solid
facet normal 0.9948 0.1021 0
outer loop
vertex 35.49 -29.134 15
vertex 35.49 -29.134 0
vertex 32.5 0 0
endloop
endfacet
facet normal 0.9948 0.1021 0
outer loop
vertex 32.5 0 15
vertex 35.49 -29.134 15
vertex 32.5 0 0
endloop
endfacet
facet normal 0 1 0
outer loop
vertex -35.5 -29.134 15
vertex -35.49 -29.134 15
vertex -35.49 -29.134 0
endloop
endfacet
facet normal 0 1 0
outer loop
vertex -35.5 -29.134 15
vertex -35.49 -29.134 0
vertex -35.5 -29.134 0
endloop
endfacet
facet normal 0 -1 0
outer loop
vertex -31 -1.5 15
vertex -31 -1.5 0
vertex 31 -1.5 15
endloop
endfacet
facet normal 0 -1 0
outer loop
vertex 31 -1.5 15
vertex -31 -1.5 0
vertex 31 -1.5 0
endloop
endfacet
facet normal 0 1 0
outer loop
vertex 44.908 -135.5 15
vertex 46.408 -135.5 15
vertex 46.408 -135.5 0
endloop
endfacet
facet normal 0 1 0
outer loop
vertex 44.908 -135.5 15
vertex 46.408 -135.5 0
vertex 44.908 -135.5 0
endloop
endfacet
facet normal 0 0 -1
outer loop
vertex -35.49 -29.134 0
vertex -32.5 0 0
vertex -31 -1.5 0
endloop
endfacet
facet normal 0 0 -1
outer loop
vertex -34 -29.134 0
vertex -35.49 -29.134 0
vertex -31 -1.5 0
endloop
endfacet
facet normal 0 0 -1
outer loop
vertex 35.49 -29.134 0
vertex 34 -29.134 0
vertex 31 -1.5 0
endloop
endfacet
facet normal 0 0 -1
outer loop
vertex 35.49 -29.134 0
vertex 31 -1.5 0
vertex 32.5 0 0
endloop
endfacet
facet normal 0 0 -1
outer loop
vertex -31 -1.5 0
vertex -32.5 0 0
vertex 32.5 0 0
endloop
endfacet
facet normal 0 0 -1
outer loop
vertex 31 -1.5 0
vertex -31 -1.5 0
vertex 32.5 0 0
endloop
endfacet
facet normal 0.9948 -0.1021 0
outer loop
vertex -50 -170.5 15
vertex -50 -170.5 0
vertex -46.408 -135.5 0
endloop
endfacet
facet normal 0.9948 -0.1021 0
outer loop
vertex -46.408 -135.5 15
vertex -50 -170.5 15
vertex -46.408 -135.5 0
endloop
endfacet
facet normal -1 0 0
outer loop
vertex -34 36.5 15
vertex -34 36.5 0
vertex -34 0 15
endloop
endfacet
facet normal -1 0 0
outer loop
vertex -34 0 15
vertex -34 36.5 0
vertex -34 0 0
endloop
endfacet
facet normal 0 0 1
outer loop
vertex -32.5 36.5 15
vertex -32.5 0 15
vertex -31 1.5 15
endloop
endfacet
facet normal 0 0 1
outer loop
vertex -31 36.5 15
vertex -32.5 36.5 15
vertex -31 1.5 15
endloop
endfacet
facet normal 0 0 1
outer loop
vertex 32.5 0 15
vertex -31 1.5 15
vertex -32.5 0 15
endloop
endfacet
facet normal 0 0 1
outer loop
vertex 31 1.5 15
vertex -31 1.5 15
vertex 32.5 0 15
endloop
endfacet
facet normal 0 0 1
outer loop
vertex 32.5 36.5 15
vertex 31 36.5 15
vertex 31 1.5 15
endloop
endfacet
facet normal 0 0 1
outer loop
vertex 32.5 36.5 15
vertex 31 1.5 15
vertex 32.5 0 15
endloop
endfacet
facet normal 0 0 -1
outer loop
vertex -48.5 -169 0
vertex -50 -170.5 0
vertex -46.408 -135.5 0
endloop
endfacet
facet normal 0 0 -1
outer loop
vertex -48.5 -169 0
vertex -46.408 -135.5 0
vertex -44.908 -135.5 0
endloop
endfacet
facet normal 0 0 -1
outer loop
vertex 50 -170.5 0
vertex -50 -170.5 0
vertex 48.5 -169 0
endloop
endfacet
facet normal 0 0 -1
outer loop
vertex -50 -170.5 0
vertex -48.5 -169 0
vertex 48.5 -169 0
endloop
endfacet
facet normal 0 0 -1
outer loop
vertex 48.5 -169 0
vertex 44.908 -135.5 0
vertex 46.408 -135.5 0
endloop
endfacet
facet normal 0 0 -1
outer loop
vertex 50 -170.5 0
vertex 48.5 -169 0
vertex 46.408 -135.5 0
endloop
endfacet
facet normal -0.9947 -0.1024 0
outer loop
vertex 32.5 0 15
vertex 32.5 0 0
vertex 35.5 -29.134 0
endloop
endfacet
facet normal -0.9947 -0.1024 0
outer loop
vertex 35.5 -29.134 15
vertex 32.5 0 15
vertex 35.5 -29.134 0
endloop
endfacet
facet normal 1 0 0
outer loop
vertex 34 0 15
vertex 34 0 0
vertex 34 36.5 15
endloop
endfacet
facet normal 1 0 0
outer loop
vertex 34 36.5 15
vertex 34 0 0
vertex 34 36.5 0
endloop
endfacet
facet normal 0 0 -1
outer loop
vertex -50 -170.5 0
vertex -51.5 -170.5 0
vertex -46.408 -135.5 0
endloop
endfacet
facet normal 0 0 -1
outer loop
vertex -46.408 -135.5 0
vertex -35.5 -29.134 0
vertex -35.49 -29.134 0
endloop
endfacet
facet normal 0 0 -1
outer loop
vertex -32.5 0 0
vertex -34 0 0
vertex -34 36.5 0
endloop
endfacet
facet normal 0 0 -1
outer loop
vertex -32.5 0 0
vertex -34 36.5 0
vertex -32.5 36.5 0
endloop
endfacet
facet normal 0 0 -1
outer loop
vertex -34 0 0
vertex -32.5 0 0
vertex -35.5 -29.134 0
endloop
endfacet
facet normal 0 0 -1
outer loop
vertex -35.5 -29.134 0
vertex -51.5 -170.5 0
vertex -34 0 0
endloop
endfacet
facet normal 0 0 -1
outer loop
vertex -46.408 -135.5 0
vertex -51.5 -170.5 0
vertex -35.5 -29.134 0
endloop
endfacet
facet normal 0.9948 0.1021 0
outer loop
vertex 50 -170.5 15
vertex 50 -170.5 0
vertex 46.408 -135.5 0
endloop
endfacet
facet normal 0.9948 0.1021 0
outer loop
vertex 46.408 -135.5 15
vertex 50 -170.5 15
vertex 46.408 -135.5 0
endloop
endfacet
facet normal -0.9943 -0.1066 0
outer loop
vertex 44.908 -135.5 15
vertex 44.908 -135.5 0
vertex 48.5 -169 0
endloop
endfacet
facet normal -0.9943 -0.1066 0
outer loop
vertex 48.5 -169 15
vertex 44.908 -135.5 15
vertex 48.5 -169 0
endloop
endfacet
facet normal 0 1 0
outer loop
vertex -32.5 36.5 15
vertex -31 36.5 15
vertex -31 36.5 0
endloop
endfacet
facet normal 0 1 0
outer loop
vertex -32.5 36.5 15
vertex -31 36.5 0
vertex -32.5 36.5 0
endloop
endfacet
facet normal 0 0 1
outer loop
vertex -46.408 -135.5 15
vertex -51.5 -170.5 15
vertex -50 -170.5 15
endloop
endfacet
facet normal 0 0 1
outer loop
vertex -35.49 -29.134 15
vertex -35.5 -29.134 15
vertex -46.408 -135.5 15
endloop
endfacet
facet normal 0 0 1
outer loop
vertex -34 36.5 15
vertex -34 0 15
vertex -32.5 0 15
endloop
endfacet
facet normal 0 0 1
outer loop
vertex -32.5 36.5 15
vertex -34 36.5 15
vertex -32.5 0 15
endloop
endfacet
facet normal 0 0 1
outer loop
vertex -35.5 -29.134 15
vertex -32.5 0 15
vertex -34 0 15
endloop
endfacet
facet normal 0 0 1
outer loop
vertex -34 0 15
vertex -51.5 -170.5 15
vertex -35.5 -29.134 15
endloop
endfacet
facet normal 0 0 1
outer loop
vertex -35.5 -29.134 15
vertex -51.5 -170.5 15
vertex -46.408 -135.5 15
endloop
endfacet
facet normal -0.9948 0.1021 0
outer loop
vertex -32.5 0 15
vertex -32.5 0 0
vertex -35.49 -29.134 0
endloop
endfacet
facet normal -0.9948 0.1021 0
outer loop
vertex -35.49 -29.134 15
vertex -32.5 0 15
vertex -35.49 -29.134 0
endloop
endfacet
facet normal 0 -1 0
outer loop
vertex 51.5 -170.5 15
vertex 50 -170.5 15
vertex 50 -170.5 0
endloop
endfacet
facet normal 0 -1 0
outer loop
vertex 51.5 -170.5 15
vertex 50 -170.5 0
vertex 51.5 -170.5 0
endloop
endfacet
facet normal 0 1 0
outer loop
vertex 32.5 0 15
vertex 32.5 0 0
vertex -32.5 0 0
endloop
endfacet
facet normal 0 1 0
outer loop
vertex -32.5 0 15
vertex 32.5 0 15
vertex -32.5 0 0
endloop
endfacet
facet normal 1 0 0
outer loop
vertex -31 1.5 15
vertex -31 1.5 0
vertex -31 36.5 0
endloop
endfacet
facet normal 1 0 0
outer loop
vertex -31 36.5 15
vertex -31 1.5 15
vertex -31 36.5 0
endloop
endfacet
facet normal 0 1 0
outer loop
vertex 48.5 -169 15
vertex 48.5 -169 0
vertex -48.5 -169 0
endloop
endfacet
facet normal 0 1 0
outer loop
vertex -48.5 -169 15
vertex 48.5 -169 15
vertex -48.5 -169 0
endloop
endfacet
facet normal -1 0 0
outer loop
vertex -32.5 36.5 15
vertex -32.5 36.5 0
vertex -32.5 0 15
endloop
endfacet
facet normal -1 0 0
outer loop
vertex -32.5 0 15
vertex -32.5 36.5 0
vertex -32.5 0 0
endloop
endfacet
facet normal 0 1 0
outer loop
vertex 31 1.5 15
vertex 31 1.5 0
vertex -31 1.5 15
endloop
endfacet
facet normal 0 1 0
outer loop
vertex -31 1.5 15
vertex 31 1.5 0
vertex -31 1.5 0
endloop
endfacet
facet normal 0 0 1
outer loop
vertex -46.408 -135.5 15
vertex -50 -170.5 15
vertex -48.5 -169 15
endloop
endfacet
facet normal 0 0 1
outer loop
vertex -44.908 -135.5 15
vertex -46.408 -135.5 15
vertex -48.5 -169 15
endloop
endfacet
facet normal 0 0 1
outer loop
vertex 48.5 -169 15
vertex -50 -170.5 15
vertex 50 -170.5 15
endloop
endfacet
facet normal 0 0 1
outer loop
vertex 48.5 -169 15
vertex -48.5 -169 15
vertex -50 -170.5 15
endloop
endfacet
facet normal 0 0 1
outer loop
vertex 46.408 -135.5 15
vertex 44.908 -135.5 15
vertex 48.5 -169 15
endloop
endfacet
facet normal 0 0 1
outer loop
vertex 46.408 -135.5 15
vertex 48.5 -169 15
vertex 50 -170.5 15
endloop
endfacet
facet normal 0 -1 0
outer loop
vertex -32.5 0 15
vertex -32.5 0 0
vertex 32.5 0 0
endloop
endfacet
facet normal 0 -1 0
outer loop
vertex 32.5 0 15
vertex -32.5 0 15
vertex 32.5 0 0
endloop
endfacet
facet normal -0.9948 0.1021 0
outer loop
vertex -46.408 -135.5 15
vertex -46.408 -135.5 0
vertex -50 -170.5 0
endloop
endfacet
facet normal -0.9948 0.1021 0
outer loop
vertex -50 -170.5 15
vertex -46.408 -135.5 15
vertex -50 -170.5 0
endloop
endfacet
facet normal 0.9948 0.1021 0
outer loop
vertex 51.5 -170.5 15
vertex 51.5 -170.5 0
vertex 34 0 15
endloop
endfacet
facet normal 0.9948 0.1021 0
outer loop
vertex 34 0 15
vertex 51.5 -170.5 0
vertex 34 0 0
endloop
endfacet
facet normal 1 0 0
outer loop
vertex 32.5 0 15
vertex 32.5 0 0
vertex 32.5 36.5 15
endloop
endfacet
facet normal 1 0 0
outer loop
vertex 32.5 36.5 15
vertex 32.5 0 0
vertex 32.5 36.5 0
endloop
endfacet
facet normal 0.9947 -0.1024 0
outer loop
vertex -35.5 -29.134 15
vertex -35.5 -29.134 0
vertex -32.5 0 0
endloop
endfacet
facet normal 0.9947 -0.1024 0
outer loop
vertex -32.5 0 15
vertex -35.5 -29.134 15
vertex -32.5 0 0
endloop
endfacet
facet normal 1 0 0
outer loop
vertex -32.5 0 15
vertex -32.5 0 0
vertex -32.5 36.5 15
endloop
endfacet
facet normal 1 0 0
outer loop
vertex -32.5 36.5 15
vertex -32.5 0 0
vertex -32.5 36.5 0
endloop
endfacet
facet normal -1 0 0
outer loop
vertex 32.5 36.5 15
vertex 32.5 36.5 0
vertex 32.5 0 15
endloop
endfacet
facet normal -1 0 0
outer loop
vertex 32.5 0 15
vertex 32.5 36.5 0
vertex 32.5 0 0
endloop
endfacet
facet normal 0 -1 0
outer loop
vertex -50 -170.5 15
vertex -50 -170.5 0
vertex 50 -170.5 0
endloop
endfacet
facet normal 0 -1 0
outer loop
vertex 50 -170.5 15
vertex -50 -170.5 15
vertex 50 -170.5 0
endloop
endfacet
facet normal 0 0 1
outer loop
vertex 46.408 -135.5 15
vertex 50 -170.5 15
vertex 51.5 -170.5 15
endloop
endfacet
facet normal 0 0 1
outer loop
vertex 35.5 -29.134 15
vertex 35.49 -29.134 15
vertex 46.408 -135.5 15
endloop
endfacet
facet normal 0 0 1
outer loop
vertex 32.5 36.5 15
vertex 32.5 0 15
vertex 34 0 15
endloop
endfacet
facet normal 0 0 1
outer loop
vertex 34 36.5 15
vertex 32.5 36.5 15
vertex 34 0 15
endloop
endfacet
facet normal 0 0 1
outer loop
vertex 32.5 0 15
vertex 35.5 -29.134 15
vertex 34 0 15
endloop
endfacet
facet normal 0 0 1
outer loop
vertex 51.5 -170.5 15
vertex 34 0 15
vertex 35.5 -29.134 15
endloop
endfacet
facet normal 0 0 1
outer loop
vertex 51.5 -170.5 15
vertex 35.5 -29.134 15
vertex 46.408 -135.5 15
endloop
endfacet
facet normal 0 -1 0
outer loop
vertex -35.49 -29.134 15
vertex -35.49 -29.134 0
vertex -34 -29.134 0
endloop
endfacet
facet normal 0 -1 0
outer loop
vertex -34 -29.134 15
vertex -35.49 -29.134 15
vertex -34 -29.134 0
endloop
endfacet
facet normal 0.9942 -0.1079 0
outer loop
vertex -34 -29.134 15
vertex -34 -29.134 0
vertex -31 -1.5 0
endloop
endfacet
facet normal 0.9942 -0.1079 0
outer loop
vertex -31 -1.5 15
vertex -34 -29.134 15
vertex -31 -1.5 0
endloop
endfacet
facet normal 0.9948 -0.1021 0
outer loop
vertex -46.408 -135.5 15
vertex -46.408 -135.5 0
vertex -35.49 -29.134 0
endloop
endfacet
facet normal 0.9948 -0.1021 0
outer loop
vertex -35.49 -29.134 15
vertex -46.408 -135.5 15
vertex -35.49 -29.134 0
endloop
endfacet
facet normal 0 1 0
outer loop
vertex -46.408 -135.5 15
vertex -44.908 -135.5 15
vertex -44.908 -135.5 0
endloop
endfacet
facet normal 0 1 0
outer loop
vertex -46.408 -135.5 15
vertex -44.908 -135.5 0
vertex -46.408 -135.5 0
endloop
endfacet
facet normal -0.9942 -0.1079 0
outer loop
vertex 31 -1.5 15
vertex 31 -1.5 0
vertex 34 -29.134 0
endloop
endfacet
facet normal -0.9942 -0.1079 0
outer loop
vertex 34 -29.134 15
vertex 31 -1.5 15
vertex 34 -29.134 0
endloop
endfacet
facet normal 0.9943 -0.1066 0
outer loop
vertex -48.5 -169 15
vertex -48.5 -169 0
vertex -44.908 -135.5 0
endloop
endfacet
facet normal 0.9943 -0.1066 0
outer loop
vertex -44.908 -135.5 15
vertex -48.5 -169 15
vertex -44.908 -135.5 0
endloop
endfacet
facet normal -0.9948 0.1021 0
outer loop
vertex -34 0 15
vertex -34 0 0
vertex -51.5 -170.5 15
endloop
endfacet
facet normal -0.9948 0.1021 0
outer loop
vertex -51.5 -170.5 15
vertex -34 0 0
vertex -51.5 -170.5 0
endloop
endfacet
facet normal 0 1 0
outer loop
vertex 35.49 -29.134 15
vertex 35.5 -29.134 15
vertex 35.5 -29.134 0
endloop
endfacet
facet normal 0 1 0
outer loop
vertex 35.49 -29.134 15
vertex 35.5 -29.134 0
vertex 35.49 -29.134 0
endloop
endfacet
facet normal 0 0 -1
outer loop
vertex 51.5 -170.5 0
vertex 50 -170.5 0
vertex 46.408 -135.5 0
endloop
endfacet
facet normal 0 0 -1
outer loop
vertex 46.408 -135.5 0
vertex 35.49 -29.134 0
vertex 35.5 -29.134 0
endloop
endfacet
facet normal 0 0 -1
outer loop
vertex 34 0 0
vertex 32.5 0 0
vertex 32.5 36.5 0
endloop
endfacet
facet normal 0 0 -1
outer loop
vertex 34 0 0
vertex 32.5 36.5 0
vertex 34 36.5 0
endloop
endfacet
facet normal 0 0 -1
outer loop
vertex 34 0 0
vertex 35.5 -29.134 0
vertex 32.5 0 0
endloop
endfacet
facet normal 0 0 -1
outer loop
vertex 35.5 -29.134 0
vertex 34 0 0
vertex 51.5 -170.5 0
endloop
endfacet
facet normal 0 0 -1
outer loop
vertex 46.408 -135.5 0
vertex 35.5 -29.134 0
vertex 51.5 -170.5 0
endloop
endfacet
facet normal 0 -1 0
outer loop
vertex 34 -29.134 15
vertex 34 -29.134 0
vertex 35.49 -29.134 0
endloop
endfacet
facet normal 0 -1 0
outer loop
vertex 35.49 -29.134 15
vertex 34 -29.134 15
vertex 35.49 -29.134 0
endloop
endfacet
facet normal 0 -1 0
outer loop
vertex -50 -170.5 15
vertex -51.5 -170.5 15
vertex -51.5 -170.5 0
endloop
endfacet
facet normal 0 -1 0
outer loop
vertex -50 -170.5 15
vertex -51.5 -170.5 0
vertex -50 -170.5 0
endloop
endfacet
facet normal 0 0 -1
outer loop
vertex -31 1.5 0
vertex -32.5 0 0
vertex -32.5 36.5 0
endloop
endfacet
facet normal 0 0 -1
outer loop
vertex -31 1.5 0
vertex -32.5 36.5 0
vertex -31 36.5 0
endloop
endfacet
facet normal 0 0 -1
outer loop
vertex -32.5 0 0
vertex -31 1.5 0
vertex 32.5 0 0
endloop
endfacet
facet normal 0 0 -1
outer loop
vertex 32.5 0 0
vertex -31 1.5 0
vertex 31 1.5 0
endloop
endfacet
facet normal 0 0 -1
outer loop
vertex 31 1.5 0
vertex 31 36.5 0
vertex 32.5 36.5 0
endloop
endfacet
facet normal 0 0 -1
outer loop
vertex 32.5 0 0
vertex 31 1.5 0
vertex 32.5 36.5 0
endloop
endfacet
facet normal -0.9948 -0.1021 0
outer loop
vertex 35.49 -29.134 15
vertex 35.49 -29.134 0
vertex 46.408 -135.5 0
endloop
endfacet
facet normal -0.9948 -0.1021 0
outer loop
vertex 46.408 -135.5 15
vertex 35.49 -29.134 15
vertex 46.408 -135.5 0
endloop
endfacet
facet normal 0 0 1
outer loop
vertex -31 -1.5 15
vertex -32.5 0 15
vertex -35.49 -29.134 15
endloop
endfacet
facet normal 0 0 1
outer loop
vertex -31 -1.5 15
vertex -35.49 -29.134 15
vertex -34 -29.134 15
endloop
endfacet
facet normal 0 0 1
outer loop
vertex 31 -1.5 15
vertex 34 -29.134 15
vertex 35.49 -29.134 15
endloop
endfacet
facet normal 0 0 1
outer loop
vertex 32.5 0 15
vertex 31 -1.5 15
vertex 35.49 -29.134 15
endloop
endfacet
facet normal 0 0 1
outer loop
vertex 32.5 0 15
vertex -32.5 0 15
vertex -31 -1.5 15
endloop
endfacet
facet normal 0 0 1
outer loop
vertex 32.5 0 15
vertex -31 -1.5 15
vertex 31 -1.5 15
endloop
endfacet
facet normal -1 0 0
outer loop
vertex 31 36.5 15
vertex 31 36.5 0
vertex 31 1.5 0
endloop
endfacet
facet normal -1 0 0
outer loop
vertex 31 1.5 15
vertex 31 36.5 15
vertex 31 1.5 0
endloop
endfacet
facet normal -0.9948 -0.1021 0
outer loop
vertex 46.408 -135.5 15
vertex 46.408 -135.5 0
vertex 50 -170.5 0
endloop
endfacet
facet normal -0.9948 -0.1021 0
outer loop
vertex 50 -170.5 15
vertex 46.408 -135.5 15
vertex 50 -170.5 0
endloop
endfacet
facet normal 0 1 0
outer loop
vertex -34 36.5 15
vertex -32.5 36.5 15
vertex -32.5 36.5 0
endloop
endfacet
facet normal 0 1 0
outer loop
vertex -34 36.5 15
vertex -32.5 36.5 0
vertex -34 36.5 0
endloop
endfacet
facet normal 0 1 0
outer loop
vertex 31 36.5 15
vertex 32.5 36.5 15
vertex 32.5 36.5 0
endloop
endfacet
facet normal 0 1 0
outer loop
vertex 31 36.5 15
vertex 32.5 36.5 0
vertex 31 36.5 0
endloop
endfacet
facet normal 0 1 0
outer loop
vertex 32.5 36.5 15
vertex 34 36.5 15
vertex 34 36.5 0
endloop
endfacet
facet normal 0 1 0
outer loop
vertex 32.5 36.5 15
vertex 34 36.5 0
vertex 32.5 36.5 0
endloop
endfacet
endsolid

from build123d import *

# Parameters (mm, degrees)
F1_DEPTH = 15
F2_DEPTH = 15
F3_DEPTH = 15
F4_DEPTH = 15
F5_DEPTH = 15


with BuildPart() as f1:
    # F0 (on Top) → F1 (new body)
    with BuildSketch(Plane.XY):
        Polygon((-44.907625, -135.5), (-46.407625, -135.5), (-50, -170.5), (0, -170.5), (50, -170.5), (46.407625, -135.5), (44.907625, -135.5), (48.5, -169), (0, -169), (-48.5, -169), align=None)
    extrude(amount=F1_DEPTH)


with BuildPart() as f2:
    # F0 (on Top) → F2 (new body)
    with BuildSketch(Plane.XY):
        Polygon((-32.5, 0), (0, 0), (32.5, 0), (32.5, 36.5), (31, 36.5), (31, 1.5), (0, 1.5), (-31, 1.5), (-31, 36.5), (-32.5, 36.5), align=None)
    extrude(amount=F2_DEPTH)


with BuildPart() as f3:
    # F0 (on Top) → F3 (new body)
    with BuildSketch(Plane.XY):
        Polygon((32.5, 0), (0, 0), (-32.5, 0), (-35.490287, -29.133944), (-34, -29.133944), (-31, -1.5), (0, -1.5), (31, -1.5), (34, -29.133944), (35.490287, -29.133944), align=None)
    extrude(amount=F3_DEPTH)


with BuildPart() as f4:
    # F0 (on Top) → F4 (new body)
    with BuildSketch(Plane.XY):
        Polygon((-35.5, -29.133944), (-32.5, 0), (-32.5, 36.5), (-34, 36.5), (-34, 0), (-51.5, -170.5), (-50, -170.5), (-46.407625, -135.5), (-35.490287, -29.133944), align=None)
    extrude(amount=F4_DEPTH)


with BuildPart() as f5:
    # F0 (on Top) → F5 (new body)
    with BuildSketch(Plane.XY):
        Polygon((32.5, 36.5), (32.5, 0), (35.5, -29.133944), (35.490287, -29.133944), (46.407625, -135.5), (50, -170.5), (51.5, -170.5), (34, 0), (34, 36.5), align=None)
    extrude(amount=F5_DEPTH)


solid = Compound([f1.part, f2.part, f3.part, f4.part, f5.part])
